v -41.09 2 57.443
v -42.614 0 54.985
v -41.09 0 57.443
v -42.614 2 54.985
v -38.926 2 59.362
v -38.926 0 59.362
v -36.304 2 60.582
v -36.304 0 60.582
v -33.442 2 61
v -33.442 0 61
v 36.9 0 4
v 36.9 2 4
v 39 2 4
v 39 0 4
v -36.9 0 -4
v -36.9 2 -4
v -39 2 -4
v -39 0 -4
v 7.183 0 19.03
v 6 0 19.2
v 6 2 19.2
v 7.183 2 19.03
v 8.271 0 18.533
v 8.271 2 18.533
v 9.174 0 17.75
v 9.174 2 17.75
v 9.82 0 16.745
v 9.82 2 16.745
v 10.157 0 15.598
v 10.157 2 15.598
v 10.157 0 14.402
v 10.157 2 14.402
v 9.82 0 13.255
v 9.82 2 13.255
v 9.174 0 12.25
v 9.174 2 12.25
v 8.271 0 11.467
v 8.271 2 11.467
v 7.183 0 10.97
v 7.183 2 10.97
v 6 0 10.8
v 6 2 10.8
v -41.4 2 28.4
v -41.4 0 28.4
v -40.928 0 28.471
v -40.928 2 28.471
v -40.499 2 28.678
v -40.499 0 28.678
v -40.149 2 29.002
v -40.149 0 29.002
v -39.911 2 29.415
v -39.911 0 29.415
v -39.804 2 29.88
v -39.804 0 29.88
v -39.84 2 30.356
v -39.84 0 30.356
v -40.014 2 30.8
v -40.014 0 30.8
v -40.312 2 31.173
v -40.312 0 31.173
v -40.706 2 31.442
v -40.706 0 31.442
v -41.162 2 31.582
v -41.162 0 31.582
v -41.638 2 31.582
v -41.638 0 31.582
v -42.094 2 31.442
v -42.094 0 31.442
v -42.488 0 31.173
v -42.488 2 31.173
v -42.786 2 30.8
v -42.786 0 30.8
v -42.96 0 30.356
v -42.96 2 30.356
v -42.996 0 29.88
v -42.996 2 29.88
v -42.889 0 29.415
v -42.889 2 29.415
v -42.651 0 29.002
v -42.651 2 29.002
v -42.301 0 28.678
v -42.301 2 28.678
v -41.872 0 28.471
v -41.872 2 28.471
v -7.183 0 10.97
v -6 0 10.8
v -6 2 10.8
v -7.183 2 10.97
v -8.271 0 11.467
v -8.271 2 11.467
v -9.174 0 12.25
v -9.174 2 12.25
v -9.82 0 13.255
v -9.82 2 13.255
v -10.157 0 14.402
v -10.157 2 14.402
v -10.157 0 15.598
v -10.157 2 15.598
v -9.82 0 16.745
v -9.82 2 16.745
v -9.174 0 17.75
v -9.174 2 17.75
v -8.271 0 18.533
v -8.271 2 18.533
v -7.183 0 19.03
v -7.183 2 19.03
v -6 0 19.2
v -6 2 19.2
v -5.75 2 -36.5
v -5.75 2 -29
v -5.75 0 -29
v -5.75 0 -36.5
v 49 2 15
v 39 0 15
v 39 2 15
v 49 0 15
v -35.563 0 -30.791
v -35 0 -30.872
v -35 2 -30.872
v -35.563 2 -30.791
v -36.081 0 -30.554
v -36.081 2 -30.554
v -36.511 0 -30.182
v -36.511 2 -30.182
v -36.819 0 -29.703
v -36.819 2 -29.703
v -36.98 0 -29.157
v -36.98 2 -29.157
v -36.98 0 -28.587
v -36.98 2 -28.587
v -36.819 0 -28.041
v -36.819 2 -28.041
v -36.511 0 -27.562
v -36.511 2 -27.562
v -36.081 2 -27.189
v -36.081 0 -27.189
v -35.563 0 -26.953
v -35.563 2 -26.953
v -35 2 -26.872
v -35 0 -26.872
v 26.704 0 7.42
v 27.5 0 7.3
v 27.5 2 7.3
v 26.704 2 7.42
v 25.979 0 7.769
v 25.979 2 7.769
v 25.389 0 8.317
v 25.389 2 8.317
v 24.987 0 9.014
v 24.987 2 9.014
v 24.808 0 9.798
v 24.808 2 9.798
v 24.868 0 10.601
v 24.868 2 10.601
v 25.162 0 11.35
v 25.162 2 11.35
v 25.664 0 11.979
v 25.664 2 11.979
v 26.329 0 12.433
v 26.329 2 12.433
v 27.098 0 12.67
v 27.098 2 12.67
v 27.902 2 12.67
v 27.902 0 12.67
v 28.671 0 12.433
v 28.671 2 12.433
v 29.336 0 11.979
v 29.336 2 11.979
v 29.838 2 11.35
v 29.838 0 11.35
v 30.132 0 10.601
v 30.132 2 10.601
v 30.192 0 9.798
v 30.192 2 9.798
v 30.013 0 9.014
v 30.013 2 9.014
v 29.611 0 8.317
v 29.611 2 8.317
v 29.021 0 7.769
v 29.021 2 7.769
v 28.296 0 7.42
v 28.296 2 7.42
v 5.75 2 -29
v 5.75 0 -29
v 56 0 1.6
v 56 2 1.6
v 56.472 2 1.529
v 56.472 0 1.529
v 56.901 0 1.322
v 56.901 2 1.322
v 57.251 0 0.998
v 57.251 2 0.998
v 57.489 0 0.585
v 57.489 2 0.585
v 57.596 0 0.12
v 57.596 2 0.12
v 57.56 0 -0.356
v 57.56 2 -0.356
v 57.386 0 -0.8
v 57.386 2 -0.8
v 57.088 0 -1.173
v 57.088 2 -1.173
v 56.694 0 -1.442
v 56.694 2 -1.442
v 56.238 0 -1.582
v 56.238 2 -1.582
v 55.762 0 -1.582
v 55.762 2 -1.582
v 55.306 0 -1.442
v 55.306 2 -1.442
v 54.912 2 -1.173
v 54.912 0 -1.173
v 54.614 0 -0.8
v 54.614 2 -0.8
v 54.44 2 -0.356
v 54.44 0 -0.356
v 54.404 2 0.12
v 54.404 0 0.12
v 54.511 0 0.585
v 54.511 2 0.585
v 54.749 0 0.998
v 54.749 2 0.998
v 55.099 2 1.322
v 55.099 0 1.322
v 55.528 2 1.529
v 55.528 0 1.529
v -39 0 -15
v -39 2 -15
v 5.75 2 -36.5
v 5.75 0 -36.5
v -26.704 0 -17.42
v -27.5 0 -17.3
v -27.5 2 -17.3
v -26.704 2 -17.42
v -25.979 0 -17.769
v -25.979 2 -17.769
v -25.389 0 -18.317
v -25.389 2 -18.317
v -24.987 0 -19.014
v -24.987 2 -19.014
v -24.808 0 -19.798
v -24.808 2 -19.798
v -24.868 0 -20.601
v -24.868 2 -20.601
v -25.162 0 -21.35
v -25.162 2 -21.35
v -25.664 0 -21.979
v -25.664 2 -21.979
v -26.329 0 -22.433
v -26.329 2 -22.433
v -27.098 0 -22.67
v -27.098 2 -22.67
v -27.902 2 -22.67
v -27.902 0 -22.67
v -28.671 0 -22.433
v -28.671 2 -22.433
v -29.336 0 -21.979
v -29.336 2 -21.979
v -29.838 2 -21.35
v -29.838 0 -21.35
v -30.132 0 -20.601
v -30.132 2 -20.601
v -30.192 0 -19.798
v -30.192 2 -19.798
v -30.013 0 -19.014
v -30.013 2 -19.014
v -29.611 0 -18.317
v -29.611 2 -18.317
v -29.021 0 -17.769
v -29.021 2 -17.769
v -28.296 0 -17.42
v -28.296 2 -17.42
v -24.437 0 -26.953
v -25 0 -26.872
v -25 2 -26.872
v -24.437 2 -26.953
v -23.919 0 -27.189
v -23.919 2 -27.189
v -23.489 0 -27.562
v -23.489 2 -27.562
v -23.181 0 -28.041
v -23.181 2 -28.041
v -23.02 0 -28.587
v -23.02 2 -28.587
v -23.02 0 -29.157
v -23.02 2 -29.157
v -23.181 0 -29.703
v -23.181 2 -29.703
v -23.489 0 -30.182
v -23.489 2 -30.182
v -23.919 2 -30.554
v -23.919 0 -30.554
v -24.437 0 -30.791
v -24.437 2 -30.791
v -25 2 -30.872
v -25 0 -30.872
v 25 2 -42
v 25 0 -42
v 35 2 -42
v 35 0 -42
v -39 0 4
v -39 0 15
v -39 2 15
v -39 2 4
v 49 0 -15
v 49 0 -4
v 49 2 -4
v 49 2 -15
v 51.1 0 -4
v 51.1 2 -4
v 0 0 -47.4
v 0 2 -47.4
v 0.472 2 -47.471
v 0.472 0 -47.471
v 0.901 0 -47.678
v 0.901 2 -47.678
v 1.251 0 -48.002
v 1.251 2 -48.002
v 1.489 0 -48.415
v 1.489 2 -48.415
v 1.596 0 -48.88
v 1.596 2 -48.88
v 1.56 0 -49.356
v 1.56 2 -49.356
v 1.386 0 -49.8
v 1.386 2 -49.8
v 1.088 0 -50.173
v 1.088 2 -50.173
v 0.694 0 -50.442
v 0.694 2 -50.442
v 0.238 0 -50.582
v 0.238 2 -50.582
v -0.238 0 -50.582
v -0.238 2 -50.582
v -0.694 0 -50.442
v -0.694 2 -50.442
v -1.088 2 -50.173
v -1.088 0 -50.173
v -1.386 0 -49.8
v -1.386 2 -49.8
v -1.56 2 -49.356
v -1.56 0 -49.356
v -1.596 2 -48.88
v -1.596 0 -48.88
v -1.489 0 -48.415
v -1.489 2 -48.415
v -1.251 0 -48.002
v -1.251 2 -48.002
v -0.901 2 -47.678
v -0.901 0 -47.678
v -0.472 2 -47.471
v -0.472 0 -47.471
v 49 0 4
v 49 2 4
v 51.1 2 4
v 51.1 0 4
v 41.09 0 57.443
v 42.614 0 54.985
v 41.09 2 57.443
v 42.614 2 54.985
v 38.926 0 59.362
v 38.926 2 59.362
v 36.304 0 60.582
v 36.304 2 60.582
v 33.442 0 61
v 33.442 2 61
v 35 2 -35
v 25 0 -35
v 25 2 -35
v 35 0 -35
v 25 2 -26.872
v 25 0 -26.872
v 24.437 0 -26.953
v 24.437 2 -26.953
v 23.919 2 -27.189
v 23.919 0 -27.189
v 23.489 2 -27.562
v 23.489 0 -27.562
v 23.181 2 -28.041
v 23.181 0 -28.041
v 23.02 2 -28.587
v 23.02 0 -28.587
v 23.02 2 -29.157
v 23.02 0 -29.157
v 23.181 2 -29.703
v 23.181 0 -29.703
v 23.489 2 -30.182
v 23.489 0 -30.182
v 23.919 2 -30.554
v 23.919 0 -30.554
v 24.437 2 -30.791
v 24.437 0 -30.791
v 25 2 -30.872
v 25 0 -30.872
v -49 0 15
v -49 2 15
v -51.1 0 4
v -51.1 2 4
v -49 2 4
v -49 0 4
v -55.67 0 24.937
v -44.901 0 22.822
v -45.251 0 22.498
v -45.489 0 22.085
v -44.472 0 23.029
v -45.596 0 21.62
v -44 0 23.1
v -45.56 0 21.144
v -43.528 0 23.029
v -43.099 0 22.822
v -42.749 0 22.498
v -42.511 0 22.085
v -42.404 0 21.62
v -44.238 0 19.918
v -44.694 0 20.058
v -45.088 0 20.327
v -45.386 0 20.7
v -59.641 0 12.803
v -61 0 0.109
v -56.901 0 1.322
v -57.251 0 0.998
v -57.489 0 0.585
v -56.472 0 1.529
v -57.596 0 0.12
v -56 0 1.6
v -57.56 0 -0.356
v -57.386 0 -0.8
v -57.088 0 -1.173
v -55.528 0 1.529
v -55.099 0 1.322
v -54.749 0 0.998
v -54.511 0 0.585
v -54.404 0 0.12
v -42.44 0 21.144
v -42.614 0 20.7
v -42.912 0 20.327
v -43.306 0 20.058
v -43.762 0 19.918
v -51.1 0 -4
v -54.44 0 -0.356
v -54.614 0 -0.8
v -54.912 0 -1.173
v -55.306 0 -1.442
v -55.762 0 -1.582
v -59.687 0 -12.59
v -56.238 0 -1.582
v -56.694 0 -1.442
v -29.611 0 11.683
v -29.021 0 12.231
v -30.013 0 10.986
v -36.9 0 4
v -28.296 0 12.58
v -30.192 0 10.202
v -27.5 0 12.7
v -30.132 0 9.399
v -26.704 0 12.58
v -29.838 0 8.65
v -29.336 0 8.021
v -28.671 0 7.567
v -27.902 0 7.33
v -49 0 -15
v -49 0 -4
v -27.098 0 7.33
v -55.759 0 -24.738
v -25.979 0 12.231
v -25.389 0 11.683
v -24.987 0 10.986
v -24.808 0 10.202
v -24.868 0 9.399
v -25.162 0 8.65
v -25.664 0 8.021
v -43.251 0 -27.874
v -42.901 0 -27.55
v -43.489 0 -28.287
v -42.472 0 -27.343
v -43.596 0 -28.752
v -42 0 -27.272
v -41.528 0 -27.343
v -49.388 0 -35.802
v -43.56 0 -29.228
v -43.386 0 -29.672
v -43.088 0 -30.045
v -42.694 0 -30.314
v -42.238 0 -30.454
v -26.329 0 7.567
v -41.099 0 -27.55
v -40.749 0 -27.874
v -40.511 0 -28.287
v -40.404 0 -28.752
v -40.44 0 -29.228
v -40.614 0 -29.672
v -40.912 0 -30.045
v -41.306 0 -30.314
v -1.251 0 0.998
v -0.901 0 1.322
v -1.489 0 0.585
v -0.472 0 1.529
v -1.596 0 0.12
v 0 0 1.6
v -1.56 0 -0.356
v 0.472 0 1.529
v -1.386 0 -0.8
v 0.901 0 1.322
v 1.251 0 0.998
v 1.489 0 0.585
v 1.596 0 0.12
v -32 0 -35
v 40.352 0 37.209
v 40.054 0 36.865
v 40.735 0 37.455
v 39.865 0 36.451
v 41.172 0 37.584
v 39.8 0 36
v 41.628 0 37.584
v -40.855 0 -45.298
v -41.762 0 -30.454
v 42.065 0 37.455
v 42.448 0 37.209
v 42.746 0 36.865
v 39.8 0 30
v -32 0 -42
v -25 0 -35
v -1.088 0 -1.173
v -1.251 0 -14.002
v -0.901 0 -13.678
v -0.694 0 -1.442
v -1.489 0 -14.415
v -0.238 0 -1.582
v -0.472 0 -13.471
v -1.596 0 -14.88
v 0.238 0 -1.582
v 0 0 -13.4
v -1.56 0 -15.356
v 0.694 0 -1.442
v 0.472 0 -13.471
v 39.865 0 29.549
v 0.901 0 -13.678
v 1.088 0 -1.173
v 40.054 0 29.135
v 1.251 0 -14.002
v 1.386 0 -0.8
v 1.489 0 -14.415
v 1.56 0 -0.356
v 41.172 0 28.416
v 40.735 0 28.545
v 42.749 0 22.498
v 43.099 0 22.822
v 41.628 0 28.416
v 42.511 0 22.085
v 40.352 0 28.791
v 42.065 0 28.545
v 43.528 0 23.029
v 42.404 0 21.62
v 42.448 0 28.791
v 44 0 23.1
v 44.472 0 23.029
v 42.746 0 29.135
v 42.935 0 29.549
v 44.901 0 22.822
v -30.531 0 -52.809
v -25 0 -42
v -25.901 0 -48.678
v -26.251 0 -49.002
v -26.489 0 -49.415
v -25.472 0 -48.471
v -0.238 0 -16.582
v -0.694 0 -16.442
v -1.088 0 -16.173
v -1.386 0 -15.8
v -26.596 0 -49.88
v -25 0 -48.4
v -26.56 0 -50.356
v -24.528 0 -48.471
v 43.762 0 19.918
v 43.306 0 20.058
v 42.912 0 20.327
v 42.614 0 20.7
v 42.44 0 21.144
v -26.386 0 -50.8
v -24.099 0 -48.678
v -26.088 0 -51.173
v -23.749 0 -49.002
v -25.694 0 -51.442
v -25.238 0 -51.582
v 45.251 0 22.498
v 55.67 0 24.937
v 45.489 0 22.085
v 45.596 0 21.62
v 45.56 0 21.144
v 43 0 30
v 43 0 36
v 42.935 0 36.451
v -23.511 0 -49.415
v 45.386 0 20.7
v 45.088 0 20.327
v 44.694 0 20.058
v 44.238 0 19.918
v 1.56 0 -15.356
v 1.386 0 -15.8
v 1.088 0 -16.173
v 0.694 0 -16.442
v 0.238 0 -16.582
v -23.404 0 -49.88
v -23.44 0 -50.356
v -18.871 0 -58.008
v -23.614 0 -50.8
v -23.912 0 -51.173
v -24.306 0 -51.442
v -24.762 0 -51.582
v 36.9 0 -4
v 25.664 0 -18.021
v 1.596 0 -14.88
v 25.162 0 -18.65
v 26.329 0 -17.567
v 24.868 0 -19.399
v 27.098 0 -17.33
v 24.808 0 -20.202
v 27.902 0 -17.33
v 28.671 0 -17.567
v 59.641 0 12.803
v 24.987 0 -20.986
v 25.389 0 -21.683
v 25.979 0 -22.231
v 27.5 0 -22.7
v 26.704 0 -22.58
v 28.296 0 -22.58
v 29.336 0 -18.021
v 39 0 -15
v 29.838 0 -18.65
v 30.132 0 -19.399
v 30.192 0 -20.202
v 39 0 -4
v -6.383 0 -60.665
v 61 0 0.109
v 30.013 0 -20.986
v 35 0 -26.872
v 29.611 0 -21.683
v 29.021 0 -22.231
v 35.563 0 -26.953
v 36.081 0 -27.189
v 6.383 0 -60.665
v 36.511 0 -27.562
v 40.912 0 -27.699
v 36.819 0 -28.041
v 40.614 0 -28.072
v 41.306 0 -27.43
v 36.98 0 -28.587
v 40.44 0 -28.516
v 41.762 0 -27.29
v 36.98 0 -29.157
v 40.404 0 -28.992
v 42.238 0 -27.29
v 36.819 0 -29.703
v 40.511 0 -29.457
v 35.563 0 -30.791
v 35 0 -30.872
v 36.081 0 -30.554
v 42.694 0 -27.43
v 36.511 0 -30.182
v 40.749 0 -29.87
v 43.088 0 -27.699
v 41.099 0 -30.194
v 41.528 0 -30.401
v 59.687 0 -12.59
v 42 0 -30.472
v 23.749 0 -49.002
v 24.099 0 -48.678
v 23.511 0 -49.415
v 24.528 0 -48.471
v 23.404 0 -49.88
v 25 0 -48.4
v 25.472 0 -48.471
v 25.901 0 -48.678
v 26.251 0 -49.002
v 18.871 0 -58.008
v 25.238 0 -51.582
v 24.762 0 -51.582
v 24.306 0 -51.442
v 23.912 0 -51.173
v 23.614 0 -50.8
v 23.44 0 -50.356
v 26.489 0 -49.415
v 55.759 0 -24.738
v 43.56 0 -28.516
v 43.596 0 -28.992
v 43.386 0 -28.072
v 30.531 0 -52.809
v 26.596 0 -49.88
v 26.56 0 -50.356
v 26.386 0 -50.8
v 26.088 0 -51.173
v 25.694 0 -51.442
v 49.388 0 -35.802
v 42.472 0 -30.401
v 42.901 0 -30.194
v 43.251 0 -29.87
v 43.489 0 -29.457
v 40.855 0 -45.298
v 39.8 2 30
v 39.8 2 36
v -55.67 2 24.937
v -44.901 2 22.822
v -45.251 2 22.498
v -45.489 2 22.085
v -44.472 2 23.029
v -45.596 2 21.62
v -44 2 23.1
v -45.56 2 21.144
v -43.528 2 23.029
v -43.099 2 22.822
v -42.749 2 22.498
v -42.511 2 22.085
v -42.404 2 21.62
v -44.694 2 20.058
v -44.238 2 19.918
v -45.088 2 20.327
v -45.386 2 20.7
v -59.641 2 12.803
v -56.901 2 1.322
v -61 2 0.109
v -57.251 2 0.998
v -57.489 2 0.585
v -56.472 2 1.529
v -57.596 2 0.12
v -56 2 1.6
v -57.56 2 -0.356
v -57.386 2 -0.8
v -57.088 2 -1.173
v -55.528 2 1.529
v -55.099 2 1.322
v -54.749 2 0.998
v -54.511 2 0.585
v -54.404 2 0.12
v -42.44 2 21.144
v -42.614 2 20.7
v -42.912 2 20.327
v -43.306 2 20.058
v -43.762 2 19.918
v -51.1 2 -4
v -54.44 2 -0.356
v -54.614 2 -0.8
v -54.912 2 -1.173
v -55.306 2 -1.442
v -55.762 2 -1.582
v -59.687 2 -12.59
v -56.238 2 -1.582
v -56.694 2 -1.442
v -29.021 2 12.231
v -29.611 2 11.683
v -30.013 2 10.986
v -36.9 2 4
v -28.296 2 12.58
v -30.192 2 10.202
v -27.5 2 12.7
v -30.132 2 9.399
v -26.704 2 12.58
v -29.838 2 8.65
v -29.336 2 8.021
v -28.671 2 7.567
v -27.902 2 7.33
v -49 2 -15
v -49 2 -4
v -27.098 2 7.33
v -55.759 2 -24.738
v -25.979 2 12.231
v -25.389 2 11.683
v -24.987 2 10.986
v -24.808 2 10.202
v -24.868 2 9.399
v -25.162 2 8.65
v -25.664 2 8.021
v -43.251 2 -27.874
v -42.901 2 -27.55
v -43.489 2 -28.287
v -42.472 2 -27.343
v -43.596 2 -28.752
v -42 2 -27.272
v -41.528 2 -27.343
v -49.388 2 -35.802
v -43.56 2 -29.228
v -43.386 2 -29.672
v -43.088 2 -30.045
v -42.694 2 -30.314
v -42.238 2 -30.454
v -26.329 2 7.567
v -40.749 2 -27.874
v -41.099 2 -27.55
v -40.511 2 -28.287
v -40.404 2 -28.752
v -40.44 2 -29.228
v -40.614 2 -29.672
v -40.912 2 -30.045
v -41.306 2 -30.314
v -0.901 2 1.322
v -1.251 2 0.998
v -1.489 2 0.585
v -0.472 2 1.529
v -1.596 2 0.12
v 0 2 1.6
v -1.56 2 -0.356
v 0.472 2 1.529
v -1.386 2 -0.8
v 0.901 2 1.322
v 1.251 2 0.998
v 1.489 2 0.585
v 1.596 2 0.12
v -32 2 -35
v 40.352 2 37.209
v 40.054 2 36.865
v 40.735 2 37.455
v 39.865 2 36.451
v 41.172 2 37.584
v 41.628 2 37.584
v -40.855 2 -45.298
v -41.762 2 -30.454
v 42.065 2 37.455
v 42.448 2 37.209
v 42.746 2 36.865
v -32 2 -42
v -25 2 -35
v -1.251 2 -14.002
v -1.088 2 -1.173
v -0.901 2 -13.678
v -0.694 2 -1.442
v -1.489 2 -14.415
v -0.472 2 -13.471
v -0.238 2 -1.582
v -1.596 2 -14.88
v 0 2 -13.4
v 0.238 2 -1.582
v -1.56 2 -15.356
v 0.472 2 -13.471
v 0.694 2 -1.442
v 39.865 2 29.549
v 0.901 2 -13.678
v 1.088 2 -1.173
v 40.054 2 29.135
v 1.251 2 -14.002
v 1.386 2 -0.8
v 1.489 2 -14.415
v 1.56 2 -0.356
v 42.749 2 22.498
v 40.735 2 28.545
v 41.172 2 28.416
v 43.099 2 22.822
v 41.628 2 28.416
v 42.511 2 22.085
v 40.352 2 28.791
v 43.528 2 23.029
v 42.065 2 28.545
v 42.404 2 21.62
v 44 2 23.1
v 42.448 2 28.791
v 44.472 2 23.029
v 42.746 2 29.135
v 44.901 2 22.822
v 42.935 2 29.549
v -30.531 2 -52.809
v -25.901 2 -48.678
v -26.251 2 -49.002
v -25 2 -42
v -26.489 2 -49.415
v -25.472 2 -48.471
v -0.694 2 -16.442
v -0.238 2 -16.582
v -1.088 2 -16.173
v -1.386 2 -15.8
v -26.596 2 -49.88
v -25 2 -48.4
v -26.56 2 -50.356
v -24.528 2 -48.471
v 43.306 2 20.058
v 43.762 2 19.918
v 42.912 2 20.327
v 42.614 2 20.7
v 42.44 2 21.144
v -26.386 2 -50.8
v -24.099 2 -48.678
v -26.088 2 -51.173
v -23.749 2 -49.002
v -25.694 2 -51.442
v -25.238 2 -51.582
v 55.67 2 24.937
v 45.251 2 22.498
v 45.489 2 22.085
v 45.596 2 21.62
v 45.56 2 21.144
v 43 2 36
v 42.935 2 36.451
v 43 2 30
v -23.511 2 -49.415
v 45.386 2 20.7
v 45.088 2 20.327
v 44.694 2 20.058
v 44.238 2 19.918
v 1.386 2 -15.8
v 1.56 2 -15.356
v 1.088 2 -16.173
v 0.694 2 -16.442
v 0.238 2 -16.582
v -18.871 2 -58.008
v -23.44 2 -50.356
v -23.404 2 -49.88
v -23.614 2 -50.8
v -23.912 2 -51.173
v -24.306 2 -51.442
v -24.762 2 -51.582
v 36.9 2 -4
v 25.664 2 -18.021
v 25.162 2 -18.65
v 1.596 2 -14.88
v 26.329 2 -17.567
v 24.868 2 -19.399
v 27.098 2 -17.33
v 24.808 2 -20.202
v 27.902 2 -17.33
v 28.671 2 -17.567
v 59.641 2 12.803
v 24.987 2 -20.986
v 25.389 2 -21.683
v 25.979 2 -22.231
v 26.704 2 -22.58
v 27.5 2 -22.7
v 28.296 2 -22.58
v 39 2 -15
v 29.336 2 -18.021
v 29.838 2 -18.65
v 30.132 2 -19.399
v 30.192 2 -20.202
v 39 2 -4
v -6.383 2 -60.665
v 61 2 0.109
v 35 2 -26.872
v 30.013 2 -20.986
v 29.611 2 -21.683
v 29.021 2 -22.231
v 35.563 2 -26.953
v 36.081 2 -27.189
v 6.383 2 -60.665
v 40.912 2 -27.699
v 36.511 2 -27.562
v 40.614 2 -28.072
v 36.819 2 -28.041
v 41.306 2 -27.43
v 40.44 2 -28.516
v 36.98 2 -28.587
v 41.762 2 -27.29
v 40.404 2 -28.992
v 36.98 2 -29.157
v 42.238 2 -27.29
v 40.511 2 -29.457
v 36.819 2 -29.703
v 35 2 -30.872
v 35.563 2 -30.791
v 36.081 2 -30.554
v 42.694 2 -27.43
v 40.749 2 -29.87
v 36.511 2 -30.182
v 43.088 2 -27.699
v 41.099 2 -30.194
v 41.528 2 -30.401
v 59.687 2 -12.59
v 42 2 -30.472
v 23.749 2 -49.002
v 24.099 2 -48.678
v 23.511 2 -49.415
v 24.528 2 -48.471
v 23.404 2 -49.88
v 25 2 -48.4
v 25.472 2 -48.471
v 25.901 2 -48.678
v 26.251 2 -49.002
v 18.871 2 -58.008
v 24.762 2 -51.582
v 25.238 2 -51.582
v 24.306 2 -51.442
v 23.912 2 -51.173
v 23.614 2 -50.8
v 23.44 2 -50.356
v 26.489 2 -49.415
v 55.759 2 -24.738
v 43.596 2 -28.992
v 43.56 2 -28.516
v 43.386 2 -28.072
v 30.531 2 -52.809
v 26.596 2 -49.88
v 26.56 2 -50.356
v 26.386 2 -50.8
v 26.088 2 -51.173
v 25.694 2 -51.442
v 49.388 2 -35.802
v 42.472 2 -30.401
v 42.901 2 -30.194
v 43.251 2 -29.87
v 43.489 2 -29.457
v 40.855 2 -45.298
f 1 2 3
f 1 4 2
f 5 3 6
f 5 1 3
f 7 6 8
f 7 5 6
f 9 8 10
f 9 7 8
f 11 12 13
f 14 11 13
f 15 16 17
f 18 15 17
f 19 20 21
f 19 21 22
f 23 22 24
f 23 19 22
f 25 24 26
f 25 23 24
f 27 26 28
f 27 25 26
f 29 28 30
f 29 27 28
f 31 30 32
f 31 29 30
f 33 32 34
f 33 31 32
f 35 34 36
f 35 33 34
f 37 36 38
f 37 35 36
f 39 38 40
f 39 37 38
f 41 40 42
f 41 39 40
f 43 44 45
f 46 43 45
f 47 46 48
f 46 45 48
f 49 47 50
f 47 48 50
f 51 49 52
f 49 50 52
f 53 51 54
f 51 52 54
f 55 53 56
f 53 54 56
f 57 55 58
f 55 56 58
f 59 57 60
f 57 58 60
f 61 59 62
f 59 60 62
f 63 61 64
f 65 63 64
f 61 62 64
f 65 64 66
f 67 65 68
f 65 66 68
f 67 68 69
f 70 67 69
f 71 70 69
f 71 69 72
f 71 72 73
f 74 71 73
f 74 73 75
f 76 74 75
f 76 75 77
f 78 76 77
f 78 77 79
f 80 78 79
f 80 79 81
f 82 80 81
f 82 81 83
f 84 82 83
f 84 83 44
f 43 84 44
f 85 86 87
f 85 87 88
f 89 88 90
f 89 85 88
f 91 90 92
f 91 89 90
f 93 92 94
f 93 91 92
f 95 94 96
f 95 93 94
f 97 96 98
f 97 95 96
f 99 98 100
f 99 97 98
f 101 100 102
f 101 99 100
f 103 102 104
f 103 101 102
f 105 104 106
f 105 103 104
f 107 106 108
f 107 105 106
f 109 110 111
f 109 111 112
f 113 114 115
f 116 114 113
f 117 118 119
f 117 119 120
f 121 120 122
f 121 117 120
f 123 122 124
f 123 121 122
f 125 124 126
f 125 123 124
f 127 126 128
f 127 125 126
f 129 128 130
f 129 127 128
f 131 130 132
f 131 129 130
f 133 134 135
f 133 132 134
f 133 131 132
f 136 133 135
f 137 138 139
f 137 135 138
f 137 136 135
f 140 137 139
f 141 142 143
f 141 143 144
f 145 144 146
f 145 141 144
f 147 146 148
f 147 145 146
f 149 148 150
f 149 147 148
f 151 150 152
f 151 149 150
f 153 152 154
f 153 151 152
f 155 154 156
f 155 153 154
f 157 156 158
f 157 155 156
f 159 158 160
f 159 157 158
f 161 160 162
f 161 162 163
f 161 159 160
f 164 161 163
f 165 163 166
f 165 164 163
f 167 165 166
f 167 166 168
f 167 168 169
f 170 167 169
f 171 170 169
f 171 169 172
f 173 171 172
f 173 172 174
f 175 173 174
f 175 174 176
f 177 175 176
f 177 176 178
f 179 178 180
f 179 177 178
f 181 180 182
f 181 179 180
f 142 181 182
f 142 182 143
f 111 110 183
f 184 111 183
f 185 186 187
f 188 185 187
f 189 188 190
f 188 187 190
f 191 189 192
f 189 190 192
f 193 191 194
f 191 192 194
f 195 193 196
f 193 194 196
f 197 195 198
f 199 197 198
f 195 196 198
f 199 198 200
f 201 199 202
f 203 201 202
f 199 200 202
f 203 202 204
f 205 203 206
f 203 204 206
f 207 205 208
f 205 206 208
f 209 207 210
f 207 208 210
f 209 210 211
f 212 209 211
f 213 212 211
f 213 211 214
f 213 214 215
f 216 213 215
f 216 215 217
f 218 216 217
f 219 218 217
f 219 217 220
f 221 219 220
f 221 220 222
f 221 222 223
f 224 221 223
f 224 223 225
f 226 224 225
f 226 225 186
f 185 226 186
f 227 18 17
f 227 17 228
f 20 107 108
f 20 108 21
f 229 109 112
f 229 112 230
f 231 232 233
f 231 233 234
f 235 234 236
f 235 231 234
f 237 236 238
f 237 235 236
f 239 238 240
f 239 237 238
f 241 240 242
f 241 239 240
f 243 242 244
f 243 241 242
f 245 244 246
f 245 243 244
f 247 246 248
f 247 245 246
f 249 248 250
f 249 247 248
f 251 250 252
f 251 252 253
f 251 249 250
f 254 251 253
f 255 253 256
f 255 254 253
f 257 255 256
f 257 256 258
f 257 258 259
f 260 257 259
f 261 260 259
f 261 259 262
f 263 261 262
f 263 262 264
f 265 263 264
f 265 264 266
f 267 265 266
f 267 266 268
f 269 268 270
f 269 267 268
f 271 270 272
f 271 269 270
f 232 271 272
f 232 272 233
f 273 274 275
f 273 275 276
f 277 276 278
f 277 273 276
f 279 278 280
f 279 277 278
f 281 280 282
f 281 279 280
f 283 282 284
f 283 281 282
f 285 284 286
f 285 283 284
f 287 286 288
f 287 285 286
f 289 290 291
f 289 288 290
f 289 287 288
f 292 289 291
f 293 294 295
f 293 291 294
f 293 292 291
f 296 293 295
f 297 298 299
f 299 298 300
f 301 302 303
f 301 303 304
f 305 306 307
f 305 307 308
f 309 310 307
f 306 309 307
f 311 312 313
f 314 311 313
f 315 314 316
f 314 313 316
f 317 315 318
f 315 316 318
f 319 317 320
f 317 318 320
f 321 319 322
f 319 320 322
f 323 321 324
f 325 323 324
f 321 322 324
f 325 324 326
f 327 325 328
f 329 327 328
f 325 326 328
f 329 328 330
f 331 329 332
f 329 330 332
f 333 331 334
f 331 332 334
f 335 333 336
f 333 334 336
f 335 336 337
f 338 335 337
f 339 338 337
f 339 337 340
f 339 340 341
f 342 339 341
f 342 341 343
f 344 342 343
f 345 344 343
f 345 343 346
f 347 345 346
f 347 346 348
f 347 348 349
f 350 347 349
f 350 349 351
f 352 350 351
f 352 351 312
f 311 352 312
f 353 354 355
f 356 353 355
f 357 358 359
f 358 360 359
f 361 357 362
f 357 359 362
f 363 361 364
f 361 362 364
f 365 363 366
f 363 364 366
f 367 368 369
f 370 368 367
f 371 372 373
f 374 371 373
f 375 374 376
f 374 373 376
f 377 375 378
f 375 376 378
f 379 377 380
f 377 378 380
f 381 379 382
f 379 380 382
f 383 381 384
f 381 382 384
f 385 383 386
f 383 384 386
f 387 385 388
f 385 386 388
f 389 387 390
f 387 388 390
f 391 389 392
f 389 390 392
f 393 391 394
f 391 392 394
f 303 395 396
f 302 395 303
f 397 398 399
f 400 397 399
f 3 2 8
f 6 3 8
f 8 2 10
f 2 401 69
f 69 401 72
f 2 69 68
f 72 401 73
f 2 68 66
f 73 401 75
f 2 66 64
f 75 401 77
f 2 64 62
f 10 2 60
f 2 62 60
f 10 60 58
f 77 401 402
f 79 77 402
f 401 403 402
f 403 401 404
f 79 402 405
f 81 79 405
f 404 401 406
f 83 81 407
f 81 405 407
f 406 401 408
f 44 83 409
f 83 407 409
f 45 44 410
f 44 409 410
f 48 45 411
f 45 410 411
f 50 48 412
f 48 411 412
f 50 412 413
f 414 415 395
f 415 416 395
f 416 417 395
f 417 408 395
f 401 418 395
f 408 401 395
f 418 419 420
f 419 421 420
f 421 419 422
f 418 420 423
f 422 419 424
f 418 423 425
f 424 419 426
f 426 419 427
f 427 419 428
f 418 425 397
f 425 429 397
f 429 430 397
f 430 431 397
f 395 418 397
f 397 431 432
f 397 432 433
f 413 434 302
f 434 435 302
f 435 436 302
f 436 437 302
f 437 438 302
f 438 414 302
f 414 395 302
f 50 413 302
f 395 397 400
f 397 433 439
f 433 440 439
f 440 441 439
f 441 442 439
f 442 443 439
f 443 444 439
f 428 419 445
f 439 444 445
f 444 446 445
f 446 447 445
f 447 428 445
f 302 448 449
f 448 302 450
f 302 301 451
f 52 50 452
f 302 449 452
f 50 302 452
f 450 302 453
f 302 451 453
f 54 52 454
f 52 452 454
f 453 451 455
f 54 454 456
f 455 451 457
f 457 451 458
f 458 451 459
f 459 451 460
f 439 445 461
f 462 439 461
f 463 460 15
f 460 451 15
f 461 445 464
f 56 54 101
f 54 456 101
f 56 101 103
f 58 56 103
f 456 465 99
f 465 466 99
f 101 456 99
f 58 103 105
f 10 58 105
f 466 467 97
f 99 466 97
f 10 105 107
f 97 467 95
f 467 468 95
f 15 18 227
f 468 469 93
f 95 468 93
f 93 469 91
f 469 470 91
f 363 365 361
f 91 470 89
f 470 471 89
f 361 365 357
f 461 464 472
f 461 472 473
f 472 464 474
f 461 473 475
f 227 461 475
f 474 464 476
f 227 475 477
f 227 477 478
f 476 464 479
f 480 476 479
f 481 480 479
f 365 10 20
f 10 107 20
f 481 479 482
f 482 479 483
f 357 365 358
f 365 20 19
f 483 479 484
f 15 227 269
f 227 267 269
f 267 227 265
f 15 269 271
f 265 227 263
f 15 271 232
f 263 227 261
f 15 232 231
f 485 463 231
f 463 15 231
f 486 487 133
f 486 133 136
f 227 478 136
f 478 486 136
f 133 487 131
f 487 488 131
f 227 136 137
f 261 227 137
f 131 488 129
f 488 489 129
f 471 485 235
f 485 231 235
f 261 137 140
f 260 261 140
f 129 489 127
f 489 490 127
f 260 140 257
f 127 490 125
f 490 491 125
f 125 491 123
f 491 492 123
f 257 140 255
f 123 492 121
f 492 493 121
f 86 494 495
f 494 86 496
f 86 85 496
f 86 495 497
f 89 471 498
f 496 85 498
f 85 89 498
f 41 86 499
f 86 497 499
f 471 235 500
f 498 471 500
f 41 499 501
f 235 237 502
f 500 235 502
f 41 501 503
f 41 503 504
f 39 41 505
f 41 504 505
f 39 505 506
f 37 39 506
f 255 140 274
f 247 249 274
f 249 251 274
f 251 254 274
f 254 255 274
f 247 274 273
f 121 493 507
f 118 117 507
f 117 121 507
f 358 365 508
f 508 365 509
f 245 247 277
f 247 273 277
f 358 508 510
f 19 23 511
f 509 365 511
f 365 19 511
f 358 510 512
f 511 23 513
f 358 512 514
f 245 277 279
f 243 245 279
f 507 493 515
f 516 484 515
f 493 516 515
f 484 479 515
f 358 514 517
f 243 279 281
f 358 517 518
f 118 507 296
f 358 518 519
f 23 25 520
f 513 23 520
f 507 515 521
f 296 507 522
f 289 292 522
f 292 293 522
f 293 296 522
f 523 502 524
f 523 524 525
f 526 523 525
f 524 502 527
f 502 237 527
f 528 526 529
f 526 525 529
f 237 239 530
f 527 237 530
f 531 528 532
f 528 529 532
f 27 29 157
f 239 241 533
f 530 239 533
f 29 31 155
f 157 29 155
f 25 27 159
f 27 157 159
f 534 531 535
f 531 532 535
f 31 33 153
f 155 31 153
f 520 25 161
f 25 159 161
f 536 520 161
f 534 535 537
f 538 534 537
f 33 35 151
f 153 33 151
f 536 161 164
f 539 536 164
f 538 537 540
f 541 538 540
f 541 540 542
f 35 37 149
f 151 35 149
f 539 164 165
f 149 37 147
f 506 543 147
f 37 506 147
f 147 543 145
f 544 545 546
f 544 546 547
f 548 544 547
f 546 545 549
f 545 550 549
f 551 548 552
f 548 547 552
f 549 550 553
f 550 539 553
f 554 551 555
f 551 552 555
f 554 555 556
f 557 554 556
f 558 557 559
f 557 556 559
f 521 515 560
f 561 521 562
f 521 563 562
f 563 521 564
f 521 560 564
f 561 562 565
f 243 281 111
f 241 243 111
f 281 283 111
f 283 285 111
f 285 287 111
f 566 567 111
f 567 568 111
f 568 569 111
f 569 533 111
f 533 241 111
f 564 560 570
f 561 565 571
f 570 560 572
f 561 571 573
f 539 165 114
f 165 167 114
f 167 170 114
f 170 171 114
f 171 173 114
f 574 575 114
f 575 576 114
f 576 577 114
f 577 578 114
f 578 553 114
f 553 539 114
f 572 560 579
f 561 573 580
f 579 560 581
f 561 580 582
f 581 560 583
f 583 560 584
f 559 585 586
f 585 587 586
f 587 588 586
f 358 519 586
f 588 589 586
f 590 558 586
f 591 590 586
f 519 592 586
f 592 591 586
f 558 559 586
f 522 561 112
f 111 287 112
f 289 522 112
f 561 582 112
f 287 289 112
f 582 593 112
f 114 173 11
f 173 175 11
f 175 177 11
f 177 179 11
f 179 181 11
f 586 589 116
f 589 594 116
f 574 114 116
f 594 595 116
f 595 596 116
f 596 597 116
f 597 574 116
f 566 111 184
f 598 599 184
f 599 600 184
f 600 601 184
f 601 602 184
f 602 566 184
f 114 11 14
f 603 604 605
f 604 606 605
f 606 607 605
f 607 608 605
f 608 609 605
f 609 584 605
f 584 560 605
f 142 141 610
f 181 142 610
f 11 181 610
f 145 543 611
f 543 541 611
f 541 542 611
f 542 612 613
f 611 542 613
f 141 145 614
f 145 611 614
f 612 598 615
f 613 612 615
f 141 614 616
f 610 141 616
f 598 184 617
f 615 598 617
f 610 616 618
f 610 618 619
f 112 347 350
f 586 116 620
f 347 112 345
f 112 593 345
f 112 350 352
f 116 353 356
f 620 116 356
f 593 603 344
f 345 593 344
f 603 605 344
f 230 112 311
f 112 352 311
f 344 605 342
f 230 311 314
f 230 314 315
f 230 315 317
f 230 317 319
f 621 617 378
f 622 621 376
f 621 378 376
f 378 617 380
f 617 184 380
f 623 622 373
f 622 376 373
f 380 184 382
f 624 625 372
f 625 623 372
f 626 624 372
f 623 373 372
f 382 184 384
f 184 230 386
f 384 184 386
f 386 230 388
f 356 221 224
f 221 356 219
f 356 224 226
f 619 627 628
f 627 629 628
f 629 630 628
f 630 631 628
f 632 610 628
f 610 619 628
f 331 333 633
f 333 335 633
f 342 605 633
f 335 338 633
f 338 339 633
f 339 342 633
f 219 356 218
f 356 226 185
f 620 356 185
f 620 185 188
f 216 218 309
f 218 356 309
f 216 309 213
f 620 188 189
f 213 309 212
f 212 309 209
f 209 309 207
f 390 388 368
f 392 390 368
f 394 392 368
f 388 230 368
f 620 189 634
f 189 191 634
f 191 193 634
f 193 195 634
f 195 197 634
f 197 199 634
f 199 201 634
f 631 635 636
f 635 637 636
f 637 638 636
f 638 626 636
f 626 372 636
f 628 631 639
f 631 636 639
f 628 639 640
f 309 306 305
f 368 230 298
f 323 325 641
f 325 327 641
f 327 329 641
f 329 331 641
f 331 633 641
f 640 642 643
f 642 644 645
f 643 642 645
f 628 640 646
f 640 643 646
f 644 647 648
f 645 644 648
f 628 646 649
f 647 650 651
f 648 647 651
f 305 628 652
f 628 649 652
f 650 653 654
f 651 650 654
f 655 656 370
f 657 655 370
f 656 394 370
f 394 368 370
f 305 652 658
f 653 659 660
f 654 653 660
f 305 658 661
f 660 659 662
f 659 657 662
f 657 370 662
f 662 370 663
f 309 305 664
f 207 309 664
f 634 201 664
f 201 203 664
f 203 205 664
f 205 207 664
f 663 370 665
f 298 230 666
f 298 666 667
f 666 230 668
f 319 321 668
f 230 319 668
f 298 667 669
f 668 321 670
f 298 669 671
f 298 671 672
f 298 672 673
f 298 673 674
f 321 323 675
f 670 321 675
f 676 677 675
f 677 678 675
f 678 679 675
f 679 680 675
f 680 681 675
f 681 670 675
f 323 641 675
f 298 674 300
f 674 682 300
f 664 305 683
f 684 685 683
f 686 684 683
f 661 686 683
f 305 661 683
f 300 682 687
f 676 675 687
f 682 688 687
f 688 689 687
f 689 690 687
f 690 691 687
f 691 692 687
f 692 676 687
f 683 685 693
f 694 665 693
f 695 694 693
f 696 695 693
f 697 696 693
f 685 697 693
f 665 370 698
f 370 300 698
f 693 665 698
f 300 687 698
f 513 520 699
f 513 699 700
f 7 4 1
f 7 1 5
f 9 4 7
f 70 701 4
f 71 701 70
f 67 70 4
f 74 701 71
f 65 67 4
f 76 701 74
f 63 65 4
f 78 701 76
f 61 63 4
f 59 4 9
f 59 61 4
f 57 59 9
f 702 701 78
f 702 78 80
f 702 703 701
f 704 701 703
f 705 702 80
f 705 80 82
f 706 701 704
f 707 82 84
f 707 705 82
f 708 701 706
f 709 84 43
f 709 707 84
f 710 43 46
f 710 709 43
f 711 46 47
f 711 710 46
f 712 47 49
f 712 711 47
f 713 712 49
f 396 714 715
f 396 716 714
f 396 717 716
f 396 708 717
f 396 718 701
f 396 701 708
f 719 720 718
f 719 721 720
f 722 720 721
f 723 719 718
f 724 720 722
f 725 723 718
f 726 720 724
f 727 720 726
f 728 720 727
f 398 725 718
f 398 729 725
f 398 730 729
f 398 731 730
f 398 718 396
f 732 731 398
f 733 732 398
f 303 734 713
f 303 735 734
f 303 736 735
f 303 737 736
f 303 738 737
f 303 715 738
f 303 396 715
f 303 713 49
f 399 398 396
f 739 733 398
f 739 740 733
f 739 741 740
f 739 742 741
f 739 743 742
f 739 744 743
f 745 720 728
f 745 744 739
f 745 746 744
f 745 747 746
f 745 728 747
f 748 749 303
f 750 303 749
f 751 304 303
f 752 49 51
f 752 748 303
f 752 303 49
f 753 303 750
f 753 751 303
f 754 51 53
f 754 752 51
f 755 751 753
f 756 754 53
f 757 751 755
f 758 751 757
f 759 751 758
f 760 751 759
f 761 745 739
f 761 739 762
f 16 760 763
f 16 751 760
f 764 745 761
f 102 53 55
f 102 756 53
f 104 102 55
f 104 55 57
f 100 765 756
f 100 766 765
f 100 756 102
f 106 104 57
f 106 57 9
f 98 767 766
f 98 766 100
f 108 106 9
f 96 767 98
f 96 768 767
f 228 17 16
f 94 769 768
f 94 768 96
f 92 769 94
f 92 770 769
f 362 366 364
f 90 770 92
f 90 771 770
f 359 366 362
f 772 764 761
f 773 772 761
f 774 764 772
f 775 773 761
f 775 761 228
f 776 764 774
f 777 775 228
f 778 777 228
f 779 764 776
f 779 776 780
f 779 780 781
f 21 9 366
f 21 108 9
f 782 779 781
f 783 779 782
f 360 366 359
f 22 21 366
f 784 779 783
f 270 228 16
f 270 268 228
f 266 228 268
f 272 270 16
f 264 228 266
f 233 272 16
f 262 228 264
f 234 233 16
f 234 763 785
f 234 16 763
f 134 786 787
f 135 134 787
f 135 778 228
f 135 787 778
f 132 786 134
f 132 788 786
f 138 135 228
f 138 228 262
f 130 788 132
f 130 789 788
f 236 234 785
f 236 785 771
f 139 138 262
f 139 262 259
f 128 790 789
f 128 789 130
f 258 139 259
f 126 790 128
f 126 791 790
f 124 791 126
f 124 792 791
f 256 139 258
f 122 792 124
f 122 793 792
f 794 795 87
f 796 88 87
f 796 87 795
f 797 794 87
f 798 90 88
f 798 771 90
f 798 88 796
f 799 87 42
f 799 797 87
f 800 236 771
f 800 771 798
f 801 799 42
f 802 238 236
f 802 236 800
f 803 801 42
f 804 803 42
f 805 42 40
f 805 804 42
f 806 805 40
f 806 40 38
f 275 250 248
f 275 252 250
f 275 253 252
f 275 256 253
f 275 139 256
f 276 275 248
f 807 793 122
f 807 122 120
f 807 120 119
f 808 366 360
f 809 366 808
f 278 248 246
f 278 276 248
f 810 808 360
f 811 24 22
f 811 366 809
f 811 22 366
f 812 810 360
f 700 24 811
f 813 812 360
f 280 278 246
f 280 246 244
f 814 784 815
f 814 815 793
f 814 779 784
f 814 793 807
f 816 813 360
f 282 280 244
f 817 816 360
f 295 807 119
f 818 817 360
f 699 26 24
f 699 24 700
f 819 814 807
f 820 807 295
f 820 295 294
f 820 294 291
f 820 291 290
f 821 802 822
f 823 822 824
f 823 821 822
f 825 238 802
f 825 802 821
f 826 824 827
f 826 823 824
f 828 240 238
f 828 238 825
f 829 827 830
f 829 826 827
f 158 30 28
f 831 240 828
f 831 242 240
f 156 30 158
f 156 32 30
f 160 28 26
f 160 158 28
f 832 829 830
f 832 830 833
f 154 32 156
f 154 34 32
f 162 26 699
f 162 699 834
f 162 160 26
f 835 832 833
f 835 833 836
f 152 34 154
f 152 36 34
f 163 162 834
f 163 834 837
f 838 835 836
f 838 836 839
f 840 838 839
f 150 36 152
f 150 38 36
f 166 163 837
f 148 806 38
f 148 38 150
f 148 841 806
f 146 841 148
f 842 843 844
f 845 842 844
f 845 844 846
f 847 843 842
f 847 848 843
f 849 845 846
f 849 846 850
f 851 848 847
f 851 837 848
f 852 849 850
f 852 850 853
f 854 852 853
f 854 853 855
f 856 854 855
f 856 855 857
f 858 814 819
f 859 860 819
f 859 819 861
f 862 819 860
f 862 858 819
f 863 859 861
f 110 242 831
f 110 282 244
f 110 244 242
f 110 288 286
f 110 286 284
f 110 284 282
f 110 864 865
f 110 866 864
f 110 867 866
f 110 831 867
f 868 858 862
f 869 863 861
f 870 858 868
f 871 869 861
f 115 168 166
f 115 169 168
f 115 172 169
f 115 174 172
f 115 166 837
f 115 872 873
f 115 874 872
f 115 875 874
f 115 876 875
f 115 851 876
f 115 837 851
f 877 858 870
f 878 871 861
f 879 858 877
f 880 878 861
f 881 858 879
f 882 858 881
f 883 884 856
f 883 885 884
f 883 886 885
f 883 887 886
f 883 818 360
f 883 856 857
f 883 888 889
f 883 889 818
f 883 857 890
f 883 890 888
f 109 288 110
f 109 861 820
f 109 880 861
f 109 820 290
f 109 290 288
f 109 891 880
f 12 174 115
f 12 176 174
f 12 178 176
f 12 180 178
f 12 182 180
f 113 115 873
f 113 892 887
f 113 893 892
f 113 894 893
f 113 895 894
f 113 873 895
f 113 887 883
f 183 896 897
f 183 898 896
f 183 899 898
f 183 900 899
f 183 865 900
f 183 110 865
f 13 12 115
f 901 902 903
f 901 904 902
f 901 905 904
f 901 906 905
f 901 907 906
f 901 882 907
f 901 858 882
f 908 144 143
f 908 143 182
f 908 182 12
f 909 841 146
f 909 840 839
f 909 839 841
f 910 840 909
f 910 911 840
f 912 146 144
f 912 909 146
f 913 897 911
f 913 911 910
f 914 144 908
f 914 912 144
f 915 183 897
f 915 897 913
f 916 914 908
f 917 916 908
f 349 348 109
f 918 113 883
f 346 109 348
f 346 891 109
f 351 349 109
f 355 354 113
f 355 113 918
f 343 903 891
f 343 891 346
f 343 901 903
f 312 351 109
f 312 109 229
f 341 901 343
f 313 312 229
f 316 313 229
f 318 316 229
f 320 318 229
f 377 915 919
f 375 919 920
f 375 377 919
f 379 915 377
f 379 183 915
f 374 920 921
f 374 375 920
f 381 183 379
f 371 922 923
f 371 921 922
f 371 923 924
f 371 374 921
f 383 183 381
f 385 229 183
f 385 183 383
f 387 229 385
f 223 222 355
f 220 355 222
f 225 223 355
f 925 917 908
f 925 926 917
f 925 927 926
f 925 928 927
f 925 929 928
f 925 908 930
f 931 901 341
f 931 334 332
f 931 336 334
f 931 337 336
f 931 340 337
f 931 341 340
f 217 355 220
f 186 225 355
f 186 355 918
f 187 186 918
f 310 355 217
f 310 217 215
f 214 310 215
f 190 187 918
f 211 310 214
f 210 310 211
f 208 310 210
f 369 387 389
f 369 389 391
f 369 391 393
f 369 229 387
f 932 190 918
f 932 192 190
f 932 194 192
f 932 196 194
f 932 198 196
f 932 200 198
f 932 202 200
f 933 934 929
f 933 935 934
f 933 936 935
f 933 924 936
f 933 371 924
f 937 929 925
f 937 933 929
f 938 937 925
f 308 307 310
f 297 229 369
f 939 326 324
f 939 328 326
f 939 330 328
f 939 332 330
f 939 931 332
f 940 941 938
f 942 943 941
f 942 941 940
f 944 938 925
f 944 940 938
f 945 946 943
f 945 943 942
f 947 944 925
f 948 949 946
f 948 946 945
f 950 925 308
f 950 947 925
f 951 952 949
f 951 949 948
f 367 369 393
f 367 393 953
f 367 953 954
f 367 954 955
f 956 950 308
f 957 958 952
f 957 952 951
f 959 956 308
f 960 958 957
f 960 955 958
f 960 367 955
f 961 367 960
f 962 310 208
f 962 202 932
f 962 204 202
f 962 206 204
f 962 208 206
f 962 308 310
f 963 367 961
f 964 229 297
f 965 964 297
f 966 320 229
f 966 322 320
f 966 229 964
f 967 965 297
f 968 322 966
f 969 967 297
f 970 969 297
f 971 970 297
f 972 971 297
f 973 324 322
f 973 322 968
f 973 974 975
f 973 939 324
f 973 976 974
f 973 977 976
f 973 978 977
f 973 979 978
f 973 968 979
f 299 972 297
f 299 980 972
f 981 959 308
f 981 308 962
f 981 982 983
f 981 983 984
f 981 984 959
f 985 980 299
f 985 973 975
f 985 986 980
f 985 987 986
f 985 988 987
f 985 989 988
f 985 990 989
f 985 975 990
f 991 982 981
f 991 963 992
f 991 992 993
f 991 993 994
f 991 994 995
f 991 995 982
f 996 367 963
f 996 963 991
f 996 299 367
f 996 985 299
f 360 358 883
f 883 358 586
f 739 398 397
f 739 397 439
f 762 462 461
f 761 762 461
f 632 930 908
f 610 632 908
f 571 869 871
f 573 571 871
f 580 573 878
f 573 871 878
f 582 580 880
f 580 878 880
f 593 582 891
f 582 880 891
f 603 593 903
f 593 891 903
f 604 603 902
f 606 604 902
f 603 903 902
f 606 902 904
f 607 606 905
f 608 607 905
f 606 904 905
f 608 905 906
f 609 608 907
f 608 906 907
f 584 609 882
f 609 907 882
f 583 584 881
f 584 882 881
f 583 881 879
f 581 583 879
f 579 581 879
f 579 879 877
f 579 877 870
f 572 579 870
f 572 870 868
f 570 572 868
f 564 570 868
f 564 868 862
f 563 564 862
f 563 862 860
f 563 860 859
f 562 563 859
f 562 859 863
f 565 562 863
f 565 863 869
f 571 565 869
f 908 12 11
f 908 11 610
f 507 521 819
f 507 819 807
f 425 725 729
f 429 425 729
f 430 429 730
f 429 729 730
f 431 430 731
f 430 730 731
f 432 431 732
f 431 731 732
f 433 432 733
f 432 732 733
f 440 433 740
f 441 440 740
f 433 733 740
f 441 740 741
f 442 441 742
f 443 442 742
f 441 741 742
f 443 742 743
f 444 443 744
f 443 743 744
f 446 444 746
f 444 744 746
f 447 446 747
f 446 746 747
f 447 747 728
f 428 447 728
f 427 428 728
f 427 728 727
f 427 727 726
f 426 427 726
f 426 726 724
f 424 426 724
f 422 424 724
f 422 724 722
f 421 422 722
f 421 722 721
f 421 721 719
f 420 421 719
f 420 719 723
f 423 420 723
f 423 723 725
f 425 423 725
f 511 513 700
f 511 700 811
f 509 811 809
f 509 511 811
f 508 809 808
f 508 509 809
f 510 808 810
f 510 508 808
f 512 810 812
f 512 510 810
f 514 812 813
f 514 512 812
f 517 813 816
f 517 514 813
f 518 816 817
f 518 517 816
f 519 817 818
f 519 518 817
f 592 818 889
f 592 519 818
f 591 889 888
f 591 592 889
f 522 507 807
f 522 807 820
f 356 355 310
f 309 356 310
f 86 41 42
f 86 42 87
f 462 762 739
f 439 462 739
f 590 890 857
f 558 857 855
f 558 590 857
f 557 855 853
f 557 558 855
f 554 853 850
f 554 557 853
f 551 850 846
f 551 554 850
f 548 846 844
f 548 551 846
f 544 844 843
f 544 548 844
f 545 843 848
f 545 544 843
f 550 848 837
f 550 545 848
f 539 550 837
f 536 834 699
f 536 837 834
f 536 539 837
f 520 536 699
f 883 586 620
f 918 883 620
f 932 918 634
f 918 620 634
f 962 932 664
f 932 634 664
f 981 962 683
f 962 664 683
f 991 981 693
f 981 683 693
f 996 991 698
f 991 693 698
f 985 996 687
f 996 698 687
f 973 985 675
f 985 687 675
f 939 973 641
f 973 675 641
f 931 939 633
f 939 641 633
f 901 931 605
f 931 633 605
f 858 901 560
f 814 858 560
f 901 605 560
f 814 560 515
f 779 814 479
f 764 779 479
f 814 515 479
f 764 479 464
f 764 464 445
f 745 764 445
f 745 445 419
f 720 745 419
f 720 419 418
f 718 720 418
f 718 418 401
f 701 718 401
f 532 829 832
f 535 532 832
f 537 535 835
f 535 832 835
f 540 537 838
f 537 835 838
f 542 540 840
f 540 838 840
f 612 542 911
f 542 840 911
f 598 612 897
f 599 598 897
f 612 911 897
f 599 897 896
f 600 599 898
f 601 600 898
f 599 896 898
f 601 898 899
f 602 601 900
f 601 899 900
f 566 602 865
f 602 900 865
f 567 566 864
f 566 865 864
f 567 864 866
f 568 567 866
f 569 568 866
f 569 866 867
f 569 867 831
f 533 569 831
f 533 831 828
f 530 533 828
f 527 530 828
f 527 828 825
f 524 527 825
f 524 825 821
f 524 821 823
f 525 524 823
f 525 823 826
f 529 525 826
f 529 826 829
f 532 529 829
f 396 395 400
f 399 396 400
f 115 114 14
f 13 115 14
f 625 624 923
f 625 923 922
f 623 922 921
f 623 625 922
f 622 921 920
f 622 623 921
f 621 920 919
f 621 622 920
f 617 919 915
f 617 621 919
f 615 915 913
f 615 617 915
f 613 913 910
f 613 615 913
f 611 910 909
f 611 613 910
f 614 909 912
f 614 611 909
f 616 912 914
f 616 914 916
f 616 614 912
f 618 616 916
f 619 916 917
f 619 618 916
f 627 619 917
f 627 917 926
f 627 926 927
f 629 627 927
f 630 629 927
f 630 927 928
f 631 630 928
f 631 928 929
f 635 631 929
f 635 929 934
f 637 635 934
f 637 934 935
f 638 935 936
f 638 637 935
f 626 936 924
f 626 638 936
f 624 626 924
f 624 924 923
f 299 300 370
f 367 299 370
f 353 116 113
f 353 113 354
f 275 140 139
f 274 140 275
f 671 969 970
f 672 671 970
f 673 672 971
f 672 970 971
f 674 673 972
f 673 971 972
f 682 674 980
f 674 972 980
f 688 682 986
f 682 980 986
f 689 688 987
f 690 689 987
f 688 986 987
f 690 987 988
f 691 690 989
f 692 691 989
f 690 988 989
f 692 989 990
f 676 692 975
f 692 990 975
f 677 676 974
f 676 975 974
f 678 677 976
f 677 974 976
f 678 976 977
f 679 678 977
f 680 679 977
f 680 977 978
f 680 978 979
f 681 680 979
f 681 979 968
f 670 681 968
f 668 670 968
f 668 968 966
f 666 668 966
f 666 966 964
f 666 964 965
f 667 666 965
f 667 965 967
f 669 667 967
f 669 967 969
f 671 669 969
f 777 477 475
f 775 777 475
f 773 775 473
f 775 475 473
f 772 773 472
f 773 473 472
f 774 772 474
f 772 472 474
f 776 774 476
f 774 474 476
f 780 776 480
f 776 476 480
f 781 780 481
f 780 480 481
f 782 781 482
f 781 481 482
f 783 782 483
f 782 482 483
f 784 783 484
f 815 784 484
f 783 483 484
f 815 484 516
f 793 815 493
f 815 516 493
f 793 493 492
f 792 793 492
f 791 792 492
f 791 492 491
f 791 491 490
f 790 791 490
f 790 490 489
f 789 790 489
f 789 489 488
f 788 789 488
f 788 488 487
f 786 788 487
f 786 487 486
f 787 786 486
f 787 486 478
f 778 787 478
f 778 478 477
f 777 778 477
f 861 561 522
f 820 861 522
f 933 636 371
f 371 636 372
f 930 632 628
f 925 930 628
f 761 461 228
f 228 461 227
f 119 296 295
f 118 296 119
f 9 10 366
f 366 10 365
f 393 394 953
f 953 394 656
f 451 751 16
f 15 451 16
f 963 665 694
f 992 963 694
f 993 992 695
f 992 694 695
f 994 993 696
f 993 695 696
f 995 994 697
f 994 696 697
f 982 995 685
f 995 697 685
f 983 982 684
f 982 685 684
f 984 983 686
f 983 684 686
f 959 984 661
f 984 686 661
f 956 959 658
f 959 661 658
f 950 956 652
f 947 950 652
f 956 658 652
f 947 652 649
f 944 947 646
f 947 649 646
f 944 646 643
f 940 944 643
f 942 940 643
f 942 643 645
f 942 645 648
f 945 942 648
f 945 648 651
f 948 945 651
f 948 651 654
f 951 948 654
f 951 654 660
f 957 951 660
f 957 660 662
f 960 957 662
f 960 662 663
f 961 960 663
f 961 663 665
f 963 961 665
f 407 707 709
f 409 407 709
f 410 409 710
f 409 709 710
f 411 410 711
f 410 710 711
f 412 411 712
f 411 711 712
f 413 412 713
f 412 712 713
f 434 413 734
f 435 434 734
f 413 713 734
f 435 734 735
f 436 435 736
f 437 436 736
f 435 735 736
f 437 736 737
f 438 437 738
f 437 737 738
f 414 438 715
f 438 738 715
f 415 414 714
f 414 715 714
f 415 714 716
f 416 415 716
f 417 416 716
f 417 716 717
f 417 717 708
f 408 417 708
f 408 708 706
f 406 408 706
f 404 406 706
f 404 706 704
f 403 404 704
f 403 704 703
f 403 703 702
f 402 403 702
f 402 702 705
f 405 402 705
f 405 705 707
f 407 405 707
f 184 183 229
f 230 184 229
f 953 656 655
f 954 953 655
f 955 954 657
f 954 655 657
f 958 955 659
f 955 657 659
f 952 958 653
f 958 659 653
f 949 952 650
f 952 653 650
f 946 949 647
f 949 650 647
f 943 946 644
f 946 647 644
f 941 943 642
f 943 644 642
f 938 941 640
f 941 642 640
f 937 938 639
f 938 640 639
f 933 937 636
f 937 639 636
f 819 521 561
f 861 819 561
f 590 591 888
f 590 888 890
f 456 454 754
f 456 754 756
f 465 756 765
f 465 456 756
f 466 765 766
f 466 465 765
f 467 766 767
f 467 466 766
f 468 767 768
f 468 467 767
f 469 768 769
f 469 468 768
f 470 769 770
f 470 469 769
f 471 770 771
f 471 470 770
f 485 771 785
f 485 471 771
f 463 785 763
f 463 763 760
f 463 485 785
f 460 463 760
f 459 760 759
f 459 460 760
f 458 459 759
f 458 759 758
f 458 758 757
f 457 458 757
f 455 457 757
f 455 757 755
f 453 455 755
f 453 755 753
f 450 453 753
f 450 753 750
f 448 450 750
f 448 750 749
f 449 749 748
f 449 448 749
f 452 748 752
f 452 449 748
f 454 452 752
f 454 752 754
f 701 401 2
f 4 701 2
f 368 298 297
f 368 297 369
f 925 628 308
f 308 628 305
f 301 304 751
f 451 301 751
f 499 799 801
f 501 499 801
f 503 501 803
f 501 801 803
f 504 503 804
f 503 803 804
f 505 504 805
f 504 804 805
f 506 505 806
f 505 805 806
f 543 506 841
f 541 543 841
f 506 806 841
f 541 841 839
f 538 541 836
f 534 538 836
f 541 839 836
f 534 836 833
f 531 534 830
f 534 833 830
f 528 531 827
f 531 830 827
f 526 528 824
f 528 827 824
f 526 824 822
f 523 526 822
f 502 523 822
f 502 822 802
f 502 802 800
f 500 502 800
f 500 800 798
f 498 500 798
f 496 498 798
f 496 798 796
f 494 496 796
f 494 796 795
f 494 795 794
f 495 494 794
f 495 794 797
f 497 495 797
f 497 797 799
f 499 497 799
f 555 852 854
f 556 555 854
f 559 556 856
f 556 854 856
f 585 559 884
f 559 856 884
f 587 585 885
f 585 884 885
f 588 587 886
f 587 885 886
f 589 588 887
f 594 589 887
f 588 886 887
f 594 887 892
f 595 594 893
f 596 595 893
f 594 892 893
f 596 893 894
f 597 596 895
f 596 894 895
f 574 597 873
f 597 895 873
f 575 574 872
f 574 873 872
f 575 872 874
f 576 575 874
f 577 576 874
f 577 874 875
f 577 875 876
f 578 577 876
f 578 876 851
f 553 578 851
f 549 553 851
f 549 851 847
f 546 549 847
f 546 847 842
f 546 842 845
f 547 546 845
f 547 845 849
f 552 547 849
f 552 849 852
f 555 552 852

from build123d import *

# Parameters (mm, degrees)
SKETCH1_R           = 61
SKETCH1_R_2         = 2.7
SKETCH1_W           = 10
SKETCH1_H           = 30
BOSS_EXTRUDE1_DEPTH = 2
SKETCH2_W           = 11.5
SKETCH2_H           = 7.5
CUT_EXTRUDE1_DEPTH  = 87.290208019
SKETCH5_R           = 1.6
SKETCH5_W           = 7
SKETCH5_H           = 7
SKETCH5_W_2         = 10
CUT_EXTRUDE4_DEPTH  = 87.290208019
SKETCH6_W           = 14.2
SKETCH6_H           = 8
SKETCH6_R           = 1.6
CUT_EXTRUDE5_DEPTH  = 87.290208019
BOSS_EXTRUDE2_START = -2
BOSS_EXTRUDE2_DEPTH = 2
FILLET1_R           = 10


with BuildPart() as part:
    # Sketch1 → Boss-Extrude1 (new body)
    with BuildSketch(Plane(origin=(0, 0, 0), x_dir=(1, 0, 0), z_dir=(0, 1, 0))):
        Circle(SKETCH1_R)
        with Locations((-27.5, 20)):
            Circle(SKETCH1_R_2, mode=Mode.SUBTRACT)
        with Locations((-27.5, -10)):
            Circle(SKETCH1_R_2, mode=Mode.SUBTRACT)
        with Locations((27.5, -10)):
            Circle(SKETCH1_R_2, mode=Mode.SUBTRACT)
        with Locations((27.5, 20)):
            Circle(SKETCH1_R_2, mode=Mode.SUBTRACT)
        with Locations((44, 0)):
            Rectangle(SKETCH1_W, SKETCH1_H, mode=Mode.SUBTRACT)
        with Locations((-44, 0)):
            Rectangle(SKETCH1_W, SKETCH1_H, mode=Mode.SUBTRACT)
    extrude(amount=BOSS_EXTRUDE1_DEPTH)

    # Sketch2 → Cut-Extrude1 (cut, through all)
    with BuildSketch(Plane(origin=(0, 2, 0), x_dir=(1, 0, 0), z_dir=(0, 1, 0))):
        with Locations((0, 32.75)):
            Rectangle(SKETCH2_W, SKETCH2_H)
    extrude(amount=-CUT_EXTRUDE1_DEPTH, mode=Mode.SUBTRACT)

    # Sketch5 → Cut-Extrude4 (cut, through all)
    with BuildSketch(Plane.XZ):
        with Locations((42, -28.871979931)):
            Circle(SKETCH5_R)
        with Locations((-42, -28.871979931)):
            Circle(SKETCH5_R)
        with Locations((-41.4, 30)):
            Circle(SKETCH5_R)
        with BuildLine():
            Line((-35, -26.871979931), (-25, -26.871979931))
            ThreePointArc((-25, -26.871979931), (-23, -28.871979931), (-25, -30.871979931))
            Line((-25, -30.871979931), (-35, -30.871979931))
            ThreePointArc((-35, -30.871979931), (-37, -28.871979931), (-35, -26.871979931))
        make_face()
        with BuildLine():
            Line((35, -26.871979931), (25, -26.871979931))
            ThreePointArc((25, -26.871979931), (23, -28.871979931), (25, -30.871979931))
            Line((25, -30.871979931), (35, -30.871979931))
            ThreePointArc((35, -30.871979931), (37, -28.871979931), (35, -26.871979931))
        make_face()
        with BuildLine():
            Line((-6, 19.2), (6, 19.2))
            ThreePointArc((6, 19.2), (10.2, 15), (6, 10.8))
            Line((6, 10.8), (-6, 10.8))
            ThreePointArc((-6, 10.8), (-10.2, 15), (-6, 19.2))
        make_face()
        with Locations((-28.5, -38.5)):
            Rectangle(SKETCH5_W, SKETCH5_H)
        with BuildLine():
            Line((39.8, 30), (39.8, 36))
            ThreePointArc((39.8, 36), (41.4, 37.6), (43, 36))
            Line((43, 36), (43, 30))
            ThreePointArc((43, 30), (41.4, 28.4), (39.8, 30))
        make_face()
        with Locations((30, -38.5)):
            Rectangle(SKETCH5_W_2, SKETCH5_H)
    extrude(amount=-CUT_EXTRUDE4_DEPTH, mode=Mode.SUBTRACT)

    # Sketch6 → Cut-Extrude5 (cut, through all)
    with BuildSketch(Plane(origin=(0, 2, 0), x_dir=(1, 0, 0), z_dir=(0, 1, 0))):
        with Locations((44, 0)):
            Rectangle(SKETCH6_W, SKETCH6_H)
        with Locations((-44, 0)):
            Rectangle(SKETCH6_W, SKETCH6_H)
        with Locations((44, -21.5)):
            Circle(SKETCH6_R)
        with Locations((-44, -21.5)):
            Circle(SKETCH6_R)
        with Locations((0, 15)):
            Circle(SKETCH6_R)
        Circle(SKETCH6_R)
        with Locations((-56, 0)):
            Circle(SKETCH6_R)
        with Locations((56, 0)):
            Circle(SKETCH6_R)
        with Locations((-25, 50)):
            Circle(SKETCH6_R)
        with Locations((25, 50)):
            Circle(SKETCH6_R)
        with Locations((0, 49)):
            Circle(SKETCH6_R)
    extrude(amount=-CUT_EXTRUDE5_DEPTH, mode=Mode.SUBTRACT)

    # Sketch7 → Boss-Extrude2 (add)
    with BuildSketch(Plane(origin=(0, 2, 0), x_dir=(1, 0, 0), z_dir=(0, 1, 0)).offset(BOSS_EXTRUDE2_START)):
        with BuildLine():
            Line((-55.670050575, -24.93682957), (-40, -61))
            Line((-40, -61), (0, -61))
            ThreePointArc((0, -61), (-33.165142818, -51.196418838), (-55.670050575, -24.93682957))
        make_face()
        with BuildLine():
            ThreePointArc((55.670050575, -24.93682957), (33.165142818, -51.196418838), (0, -61))
            Line((0, -61), (40, -61))
            Line((40, -61), (55.670050575, -24.93682957))
        make_face()
    extrude(amount=BOSS_EXTRUDE2_DEPTH)

    # Fillet1
    fillet1_edges = [part.edges().sort_by_distance(p)[0] for p in [
        (40, 1, 61),
        (-40, 1, 61),
    ]]
    fillet(fillet1_edges, radius=FILLET1_R)


solid = part.part
